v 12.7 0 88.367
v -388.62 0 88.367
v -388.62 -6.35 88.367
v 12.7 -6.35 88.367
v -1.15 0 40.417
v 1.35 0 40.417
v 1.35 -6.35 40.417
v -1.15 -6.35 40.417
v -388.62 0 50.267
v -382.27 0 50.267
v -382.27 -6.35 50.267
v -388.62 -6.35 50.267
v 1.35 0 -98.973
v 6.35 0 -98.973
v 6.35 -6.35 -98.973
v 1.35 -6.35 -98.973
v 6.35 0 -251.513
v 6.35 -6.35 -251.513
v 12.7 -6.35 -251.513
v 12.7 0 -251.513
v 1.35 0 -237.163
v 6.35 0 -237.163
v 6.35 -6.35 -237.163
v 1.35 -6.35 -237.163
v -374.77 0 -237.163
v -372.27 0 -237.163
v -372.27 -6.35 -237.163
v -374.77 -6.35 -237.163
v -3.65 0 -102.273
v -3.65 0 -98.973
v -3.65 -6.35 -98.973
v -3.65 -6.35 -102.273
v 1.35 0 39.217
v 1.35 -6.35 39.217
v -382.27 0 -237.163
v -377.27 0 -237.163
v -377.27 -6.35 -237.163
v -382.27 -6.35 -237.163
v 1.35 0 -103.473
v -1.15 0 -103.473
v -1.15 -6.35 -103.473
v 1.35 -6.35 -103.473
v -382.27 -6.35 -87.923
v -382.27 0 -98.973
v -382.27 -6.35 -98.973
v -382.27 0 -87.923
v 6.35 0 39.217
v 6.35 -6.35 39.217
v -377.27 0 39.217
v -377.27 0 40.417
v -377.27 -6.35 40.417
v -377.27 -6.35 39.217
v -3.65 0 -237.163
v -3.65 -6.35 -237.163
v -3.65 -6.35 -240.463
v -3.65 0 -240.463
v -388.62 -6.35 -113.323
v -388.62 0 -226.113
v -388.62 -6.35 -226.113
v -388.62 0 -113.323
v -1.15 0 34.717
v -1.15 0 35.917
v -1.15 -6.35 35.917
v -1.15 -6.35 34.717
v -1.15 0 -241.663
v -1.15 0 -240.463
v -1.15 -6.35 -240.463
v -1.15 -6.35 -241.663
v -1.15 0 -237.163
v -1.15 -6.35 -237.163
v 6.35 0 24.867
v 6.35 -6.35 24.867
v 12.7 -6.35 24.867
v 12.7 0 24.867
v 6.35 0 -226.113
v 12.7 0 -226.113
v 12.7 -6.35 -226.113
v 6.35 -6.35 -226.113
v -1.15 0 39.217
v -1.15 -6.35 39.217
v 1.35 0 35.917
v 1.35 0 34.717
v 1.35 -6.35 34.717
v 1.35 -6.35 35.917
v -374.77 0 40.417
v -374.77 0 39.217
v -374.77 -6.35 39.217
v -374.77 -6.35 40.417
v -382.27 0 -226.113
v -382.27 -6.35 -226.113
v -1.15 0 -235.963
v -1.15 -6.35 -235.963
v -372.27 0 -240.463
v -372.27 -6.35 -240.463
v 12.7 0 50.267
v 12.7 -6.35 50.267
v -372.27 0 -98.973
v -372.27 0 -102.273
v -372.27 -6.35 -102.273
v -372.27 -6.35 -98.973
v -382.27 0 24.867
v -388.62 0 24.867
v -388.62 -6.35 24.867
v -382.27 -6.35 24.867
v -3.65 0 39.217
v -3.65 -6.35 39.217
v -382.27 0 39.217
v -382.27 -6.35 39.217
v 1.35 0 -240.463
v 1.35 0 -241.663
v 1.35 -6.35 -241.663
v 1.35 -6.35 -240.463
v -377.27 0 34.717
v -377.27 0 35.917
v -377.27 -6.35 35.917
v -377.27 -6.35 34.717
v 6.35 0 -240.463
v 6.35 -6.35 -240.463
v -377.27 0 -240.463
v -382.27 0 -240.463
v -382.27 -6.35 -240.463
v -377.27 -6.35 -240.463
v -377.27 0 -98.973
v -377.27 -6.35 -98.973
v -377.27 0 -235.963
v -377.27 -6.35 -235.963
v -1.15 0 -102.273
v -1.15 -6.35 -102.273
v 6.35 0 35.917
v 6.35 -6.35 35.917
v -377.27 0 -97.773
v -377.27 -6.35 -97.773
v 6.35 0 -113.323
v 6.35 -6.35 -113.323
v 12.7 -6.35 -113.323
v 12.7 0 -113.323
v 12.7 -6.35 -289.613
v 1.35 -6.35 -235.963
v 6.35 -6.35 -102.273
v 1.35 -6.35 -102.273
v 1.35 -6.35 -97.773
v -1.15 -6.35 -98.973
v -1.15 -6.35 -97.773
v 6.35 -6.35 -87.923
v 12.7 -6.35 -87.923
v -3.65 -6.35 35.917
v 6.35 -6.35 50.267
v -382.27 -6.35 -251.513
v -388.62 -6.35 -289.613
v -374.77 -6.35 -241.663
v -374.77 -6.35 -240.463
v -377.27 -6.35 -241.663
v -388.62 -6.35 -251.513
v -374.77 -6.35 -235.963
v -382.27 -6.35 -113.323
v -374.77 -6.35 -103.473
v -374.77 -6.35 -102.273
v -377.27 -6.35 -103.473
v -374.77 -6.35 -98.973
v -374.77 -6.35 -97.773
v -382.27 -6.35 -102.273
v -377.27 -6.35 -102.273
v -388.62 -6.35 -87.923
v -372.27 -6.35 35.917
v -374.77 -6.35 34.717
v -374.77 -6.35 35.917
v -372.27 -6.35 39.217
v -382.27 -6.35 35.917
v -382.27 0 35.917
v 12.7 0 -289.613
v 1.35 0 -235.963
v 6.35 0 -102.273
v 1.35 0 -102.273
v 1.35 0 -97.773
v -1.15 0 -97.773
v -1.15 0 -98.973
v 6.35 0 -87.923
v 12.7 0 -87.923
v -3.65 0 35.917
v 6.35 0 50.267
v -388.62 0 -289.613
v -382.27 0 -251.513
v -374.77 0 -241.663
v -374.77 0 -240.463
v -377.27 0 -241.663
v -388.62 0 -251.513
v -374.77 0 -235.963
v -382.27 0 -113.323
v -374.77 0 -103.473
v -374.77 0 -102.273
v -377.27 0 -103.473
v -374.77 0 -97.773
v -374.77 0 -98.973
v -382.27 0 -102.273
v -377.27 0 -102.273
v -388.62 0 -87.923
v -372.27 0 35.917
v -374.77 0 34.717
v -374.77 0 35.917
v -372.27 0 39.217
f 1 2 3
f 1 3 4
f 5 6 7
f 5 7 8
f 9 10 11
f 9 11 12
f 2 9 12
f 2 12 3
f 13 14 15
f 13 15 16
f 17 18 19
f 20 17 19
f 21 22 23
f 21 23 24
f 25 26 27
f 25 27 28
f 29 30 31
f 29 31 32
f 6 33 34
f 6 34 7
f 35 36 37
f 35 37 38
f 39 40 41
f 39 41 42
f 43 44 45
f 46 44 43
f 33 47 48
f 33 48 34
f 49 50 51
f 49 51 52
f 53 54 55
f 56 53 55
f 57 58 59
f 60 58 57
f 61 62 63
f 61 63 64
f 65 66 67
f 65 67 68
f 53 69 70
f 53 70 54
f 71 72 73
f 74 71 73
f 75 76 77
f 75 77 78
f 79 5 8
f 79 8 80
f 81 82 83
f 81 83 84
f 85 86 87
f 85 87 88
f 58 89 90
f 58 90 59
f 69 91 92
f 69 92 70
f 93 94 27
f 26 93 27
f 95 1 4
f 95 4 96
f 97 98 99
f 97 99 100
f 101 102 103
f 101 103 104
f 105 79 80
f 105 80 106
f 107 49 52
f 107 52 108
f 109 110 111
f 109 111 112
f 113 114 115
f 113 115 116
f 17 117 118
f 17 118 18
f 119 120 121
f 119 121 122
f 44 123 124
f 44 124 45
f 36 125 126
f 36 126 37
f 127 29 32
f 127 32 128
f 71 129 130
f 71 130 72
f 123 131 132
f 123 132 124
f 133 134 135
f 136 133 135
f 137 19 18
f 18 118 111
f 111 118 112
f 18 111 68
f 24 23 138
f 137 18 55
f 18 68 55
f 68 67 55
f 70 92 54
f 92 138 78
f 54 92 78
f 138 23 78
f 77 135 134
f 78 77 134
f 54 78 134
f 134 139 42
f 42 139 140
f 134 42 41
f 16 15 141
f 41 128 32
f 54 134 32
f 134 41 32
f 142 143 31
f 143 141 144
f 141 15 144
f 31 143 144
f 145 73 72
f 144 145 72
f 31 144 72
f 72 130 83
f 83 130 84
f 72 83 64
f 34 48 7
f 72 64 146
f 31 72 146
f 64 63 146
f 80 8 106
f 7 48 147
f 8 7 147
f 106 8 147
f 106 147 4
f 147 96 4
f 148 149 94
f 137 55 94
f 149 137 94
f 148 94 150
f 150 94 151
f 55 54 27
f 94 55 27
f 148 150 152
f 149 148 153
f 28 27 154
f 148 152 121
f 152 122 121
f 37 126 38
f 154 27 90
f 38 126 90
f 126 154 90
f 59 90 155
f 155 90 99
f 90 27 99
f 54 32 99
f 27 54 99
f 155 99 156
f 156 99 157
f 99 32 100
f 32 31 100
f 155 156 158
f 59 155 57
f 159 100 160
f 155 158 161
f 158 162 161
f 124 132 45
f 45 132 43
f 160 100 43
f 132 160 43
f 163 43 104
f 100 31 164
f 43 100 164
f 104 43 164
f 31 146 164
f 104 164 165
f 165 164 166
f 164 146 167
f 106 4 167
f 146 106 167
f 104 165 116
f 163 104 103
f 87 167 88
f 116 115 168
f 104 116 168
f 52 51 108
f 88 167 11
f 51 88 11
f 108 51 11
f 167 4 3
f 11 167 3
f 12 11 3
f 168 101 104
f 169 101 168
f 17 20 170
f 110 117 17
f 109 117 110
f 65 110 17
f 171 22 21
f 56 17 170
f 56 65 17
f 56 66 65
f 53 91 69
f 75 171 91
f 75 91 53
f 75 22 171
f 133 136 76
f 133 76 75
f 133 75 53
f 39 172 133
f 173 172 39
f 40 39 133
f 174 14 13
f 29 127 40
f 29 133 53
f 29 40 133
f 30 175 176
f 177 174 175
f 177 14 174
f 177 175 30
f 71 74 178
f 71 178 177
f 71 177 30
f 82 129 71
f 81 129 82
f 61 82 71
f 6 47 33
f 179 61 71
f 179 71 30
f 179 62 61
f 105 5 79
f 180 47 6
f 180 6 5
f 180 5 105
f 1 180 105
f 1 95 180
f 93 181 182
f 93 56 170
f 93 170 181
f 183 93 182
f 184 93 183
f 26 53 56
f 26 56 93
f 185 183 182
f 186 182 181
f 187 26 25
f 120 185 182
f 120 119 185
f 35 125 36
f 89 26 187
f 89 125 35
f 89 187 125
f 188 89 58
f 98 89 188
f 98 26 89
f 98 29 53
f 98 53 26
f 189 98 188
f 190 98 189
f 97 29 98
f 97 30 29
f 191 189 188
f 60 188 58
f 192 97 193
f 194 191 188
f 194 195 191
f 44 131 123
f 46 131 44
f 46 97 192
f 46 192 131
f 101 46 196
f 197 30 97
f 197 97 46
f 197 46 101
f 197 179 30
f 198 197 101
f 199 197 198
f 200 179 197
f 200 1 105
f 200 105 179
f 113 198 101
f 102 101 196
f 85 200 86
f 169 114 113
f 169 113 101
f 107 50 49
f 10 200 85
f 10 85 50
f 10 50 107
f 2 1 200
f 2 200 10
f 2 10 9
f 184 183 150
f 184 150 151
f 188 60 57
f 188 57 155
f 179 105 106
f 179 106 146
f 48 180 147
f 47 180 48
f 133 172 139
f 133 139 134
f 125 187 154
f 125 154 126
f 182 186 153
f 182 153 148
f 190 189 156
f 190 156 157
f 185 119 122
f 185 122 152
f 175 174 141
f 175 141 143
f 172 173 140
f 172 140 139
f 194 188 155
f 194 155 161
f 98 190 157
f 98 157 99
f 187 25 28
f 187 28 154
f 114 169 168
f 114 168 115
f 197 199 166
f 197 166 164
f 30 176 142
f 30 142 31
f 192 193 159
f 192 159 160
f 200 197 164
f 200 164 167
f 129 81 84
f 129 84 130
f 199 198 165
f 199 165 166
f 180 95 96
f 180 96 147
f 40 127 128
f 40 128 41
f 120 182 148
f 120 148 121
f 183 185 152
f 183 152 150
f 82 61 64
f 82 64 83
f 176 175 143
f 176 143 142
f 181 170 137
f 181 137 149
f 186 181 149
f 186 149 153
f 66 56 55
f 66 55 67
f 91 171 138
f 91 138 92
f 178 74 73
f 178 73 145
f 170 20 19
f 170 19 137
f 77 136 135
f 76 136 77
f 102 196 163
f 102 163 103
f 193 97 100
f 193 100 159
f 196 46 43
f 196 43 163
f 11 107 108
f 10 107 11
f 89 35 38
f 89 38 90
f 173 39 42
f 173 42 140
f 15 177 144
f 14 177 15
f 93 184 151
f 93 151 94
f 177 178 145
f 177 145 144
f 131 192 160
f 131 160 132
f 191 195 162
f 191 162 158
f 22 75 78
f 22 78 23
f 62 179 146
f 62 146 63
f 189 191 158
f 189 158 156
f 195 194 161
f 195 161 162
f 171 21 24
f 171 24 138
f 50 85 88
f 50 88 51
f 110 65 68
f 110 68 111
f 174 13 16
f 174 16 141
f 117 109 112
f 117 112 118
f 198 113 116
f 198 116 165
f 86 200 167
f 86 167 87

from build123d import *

# Parameters (mm, degrees)
BOSS_EXTRUDE1_DEPTH = 6.35


with BuildPart() as part:
    # Sketch1 → Boss-Extrude1 (new body)
    with BuildSketch(Plane(origin=(0, 0, -215.916475579), x_dir=(-1, 0, 0), z_dir=(0, 1, 0))):
        Polygon((1.15, 250.633169195), (-1.35, 250.633169195), (-1.35, 251.833169195), (-6.35, 251.833169195), (-6.35, 240.783169195), (-12.7, 240.783169195), (-12.7, 127.993502461), (-6.35, 127.993502461), (-6.35, 116.943502461), (-1.35, 116.943502461), (-1.35, 118.143502461), (1.15, 118.143502461), (1.15, 116.943502461), (3.65, 116.943502461), (3.65, 113.643502461), (1.15, 113.643502461), (1.15, 112.443502461), (-1.35, 112.443502461), (-1.35, 113.643502461), (-6.35, 113.643502461), (-6.35, 102.593502461), (-12.7, 102.593502461), (-12.7, -10.196164273), (-6.35, -10.196164273), (-6.35, -21.246164273), (-1.35, -21.246164273), (-1.35, -20.046164273), (1.15, -20.046164273), (1.15, -21.246164273), (3.65, -21.246164273), (3.65, -24.546164273), (1.15, -24.546164273), (1.15, -25.746164273), (-1.35, -25.746164273), (-1.35, -24.546164273), (-6.35, -24.546164273), (-6.35, -35.596164273), (-12.7, -35.596164273), (-12.7, -73.696164273), (388.62, -73.696164273), (388.62, -35.596164273), (382.27, -35.596164273), (382.27, -24.546164273), (377.27, -24.546164273), (377.27, -25.746164273), (374.77, -25.746164273), (374.77, -24.546164273), (372.27, -24.546164273), (372.27, -21.246164273), (374.77, -21.246164273), (374.77, -20.046164273), (377.27, -20.046164273), (377.27, -21.246164273), (382.27, -21.246164273), (382.27, -10.196164273), (388.62, -10.196164273), (388.62, 102.593502461), (382.27, 102.593502461), (382.27, 113.643502461), (377.27, 113.643502461), (377.27, 112.443502461), (374.77, 112.443502461), (374.77, 113.643502461), (372.27, 113.643502461), (372.27, 116.943502461), (374.77, 116.943502461), (374.77, 118.143502461), (377.27, 118.143502461), (377.27, 116.943502461), (382.27, 116.943502461), (382.27, 127.993502461), (388.62, 127.993502461), (388.62, 240.783169195), (382.27, 240.783169195), (382.27, 251.833169195), (377.27, 251.833169195), (377.27, 250.633169195), (374.77, 250.633169195), (374.77, 251.833169195), (372.27, 251.833169195), (372.27, 255.133169195), (374.77, 255.133169195), (374.77, 256.333169195), (377.27, 256.333169195), (377.27, 255.133169195), (382.27, 255.133169195), (382.27, 266.183169195), (388.62, 266.183169195), (388.62, 304.283169195), (-12.7, 304.283169195), (-12.7, 266.183169195), (-6.35, 266.183169195), (-6.35, 255.133169195), (-1.35, 255.133169195), (-1.35, 256.333169195), (1.15, 256.333169195), (1.15, 255.133169195), (3.65, 255.133169195), (3.65, 251.833169195), (1.15, 251.833169195), align=None)
    extrude(amount=-BOSS_EXTRUDE1_DEPTH)


solid = part.part
